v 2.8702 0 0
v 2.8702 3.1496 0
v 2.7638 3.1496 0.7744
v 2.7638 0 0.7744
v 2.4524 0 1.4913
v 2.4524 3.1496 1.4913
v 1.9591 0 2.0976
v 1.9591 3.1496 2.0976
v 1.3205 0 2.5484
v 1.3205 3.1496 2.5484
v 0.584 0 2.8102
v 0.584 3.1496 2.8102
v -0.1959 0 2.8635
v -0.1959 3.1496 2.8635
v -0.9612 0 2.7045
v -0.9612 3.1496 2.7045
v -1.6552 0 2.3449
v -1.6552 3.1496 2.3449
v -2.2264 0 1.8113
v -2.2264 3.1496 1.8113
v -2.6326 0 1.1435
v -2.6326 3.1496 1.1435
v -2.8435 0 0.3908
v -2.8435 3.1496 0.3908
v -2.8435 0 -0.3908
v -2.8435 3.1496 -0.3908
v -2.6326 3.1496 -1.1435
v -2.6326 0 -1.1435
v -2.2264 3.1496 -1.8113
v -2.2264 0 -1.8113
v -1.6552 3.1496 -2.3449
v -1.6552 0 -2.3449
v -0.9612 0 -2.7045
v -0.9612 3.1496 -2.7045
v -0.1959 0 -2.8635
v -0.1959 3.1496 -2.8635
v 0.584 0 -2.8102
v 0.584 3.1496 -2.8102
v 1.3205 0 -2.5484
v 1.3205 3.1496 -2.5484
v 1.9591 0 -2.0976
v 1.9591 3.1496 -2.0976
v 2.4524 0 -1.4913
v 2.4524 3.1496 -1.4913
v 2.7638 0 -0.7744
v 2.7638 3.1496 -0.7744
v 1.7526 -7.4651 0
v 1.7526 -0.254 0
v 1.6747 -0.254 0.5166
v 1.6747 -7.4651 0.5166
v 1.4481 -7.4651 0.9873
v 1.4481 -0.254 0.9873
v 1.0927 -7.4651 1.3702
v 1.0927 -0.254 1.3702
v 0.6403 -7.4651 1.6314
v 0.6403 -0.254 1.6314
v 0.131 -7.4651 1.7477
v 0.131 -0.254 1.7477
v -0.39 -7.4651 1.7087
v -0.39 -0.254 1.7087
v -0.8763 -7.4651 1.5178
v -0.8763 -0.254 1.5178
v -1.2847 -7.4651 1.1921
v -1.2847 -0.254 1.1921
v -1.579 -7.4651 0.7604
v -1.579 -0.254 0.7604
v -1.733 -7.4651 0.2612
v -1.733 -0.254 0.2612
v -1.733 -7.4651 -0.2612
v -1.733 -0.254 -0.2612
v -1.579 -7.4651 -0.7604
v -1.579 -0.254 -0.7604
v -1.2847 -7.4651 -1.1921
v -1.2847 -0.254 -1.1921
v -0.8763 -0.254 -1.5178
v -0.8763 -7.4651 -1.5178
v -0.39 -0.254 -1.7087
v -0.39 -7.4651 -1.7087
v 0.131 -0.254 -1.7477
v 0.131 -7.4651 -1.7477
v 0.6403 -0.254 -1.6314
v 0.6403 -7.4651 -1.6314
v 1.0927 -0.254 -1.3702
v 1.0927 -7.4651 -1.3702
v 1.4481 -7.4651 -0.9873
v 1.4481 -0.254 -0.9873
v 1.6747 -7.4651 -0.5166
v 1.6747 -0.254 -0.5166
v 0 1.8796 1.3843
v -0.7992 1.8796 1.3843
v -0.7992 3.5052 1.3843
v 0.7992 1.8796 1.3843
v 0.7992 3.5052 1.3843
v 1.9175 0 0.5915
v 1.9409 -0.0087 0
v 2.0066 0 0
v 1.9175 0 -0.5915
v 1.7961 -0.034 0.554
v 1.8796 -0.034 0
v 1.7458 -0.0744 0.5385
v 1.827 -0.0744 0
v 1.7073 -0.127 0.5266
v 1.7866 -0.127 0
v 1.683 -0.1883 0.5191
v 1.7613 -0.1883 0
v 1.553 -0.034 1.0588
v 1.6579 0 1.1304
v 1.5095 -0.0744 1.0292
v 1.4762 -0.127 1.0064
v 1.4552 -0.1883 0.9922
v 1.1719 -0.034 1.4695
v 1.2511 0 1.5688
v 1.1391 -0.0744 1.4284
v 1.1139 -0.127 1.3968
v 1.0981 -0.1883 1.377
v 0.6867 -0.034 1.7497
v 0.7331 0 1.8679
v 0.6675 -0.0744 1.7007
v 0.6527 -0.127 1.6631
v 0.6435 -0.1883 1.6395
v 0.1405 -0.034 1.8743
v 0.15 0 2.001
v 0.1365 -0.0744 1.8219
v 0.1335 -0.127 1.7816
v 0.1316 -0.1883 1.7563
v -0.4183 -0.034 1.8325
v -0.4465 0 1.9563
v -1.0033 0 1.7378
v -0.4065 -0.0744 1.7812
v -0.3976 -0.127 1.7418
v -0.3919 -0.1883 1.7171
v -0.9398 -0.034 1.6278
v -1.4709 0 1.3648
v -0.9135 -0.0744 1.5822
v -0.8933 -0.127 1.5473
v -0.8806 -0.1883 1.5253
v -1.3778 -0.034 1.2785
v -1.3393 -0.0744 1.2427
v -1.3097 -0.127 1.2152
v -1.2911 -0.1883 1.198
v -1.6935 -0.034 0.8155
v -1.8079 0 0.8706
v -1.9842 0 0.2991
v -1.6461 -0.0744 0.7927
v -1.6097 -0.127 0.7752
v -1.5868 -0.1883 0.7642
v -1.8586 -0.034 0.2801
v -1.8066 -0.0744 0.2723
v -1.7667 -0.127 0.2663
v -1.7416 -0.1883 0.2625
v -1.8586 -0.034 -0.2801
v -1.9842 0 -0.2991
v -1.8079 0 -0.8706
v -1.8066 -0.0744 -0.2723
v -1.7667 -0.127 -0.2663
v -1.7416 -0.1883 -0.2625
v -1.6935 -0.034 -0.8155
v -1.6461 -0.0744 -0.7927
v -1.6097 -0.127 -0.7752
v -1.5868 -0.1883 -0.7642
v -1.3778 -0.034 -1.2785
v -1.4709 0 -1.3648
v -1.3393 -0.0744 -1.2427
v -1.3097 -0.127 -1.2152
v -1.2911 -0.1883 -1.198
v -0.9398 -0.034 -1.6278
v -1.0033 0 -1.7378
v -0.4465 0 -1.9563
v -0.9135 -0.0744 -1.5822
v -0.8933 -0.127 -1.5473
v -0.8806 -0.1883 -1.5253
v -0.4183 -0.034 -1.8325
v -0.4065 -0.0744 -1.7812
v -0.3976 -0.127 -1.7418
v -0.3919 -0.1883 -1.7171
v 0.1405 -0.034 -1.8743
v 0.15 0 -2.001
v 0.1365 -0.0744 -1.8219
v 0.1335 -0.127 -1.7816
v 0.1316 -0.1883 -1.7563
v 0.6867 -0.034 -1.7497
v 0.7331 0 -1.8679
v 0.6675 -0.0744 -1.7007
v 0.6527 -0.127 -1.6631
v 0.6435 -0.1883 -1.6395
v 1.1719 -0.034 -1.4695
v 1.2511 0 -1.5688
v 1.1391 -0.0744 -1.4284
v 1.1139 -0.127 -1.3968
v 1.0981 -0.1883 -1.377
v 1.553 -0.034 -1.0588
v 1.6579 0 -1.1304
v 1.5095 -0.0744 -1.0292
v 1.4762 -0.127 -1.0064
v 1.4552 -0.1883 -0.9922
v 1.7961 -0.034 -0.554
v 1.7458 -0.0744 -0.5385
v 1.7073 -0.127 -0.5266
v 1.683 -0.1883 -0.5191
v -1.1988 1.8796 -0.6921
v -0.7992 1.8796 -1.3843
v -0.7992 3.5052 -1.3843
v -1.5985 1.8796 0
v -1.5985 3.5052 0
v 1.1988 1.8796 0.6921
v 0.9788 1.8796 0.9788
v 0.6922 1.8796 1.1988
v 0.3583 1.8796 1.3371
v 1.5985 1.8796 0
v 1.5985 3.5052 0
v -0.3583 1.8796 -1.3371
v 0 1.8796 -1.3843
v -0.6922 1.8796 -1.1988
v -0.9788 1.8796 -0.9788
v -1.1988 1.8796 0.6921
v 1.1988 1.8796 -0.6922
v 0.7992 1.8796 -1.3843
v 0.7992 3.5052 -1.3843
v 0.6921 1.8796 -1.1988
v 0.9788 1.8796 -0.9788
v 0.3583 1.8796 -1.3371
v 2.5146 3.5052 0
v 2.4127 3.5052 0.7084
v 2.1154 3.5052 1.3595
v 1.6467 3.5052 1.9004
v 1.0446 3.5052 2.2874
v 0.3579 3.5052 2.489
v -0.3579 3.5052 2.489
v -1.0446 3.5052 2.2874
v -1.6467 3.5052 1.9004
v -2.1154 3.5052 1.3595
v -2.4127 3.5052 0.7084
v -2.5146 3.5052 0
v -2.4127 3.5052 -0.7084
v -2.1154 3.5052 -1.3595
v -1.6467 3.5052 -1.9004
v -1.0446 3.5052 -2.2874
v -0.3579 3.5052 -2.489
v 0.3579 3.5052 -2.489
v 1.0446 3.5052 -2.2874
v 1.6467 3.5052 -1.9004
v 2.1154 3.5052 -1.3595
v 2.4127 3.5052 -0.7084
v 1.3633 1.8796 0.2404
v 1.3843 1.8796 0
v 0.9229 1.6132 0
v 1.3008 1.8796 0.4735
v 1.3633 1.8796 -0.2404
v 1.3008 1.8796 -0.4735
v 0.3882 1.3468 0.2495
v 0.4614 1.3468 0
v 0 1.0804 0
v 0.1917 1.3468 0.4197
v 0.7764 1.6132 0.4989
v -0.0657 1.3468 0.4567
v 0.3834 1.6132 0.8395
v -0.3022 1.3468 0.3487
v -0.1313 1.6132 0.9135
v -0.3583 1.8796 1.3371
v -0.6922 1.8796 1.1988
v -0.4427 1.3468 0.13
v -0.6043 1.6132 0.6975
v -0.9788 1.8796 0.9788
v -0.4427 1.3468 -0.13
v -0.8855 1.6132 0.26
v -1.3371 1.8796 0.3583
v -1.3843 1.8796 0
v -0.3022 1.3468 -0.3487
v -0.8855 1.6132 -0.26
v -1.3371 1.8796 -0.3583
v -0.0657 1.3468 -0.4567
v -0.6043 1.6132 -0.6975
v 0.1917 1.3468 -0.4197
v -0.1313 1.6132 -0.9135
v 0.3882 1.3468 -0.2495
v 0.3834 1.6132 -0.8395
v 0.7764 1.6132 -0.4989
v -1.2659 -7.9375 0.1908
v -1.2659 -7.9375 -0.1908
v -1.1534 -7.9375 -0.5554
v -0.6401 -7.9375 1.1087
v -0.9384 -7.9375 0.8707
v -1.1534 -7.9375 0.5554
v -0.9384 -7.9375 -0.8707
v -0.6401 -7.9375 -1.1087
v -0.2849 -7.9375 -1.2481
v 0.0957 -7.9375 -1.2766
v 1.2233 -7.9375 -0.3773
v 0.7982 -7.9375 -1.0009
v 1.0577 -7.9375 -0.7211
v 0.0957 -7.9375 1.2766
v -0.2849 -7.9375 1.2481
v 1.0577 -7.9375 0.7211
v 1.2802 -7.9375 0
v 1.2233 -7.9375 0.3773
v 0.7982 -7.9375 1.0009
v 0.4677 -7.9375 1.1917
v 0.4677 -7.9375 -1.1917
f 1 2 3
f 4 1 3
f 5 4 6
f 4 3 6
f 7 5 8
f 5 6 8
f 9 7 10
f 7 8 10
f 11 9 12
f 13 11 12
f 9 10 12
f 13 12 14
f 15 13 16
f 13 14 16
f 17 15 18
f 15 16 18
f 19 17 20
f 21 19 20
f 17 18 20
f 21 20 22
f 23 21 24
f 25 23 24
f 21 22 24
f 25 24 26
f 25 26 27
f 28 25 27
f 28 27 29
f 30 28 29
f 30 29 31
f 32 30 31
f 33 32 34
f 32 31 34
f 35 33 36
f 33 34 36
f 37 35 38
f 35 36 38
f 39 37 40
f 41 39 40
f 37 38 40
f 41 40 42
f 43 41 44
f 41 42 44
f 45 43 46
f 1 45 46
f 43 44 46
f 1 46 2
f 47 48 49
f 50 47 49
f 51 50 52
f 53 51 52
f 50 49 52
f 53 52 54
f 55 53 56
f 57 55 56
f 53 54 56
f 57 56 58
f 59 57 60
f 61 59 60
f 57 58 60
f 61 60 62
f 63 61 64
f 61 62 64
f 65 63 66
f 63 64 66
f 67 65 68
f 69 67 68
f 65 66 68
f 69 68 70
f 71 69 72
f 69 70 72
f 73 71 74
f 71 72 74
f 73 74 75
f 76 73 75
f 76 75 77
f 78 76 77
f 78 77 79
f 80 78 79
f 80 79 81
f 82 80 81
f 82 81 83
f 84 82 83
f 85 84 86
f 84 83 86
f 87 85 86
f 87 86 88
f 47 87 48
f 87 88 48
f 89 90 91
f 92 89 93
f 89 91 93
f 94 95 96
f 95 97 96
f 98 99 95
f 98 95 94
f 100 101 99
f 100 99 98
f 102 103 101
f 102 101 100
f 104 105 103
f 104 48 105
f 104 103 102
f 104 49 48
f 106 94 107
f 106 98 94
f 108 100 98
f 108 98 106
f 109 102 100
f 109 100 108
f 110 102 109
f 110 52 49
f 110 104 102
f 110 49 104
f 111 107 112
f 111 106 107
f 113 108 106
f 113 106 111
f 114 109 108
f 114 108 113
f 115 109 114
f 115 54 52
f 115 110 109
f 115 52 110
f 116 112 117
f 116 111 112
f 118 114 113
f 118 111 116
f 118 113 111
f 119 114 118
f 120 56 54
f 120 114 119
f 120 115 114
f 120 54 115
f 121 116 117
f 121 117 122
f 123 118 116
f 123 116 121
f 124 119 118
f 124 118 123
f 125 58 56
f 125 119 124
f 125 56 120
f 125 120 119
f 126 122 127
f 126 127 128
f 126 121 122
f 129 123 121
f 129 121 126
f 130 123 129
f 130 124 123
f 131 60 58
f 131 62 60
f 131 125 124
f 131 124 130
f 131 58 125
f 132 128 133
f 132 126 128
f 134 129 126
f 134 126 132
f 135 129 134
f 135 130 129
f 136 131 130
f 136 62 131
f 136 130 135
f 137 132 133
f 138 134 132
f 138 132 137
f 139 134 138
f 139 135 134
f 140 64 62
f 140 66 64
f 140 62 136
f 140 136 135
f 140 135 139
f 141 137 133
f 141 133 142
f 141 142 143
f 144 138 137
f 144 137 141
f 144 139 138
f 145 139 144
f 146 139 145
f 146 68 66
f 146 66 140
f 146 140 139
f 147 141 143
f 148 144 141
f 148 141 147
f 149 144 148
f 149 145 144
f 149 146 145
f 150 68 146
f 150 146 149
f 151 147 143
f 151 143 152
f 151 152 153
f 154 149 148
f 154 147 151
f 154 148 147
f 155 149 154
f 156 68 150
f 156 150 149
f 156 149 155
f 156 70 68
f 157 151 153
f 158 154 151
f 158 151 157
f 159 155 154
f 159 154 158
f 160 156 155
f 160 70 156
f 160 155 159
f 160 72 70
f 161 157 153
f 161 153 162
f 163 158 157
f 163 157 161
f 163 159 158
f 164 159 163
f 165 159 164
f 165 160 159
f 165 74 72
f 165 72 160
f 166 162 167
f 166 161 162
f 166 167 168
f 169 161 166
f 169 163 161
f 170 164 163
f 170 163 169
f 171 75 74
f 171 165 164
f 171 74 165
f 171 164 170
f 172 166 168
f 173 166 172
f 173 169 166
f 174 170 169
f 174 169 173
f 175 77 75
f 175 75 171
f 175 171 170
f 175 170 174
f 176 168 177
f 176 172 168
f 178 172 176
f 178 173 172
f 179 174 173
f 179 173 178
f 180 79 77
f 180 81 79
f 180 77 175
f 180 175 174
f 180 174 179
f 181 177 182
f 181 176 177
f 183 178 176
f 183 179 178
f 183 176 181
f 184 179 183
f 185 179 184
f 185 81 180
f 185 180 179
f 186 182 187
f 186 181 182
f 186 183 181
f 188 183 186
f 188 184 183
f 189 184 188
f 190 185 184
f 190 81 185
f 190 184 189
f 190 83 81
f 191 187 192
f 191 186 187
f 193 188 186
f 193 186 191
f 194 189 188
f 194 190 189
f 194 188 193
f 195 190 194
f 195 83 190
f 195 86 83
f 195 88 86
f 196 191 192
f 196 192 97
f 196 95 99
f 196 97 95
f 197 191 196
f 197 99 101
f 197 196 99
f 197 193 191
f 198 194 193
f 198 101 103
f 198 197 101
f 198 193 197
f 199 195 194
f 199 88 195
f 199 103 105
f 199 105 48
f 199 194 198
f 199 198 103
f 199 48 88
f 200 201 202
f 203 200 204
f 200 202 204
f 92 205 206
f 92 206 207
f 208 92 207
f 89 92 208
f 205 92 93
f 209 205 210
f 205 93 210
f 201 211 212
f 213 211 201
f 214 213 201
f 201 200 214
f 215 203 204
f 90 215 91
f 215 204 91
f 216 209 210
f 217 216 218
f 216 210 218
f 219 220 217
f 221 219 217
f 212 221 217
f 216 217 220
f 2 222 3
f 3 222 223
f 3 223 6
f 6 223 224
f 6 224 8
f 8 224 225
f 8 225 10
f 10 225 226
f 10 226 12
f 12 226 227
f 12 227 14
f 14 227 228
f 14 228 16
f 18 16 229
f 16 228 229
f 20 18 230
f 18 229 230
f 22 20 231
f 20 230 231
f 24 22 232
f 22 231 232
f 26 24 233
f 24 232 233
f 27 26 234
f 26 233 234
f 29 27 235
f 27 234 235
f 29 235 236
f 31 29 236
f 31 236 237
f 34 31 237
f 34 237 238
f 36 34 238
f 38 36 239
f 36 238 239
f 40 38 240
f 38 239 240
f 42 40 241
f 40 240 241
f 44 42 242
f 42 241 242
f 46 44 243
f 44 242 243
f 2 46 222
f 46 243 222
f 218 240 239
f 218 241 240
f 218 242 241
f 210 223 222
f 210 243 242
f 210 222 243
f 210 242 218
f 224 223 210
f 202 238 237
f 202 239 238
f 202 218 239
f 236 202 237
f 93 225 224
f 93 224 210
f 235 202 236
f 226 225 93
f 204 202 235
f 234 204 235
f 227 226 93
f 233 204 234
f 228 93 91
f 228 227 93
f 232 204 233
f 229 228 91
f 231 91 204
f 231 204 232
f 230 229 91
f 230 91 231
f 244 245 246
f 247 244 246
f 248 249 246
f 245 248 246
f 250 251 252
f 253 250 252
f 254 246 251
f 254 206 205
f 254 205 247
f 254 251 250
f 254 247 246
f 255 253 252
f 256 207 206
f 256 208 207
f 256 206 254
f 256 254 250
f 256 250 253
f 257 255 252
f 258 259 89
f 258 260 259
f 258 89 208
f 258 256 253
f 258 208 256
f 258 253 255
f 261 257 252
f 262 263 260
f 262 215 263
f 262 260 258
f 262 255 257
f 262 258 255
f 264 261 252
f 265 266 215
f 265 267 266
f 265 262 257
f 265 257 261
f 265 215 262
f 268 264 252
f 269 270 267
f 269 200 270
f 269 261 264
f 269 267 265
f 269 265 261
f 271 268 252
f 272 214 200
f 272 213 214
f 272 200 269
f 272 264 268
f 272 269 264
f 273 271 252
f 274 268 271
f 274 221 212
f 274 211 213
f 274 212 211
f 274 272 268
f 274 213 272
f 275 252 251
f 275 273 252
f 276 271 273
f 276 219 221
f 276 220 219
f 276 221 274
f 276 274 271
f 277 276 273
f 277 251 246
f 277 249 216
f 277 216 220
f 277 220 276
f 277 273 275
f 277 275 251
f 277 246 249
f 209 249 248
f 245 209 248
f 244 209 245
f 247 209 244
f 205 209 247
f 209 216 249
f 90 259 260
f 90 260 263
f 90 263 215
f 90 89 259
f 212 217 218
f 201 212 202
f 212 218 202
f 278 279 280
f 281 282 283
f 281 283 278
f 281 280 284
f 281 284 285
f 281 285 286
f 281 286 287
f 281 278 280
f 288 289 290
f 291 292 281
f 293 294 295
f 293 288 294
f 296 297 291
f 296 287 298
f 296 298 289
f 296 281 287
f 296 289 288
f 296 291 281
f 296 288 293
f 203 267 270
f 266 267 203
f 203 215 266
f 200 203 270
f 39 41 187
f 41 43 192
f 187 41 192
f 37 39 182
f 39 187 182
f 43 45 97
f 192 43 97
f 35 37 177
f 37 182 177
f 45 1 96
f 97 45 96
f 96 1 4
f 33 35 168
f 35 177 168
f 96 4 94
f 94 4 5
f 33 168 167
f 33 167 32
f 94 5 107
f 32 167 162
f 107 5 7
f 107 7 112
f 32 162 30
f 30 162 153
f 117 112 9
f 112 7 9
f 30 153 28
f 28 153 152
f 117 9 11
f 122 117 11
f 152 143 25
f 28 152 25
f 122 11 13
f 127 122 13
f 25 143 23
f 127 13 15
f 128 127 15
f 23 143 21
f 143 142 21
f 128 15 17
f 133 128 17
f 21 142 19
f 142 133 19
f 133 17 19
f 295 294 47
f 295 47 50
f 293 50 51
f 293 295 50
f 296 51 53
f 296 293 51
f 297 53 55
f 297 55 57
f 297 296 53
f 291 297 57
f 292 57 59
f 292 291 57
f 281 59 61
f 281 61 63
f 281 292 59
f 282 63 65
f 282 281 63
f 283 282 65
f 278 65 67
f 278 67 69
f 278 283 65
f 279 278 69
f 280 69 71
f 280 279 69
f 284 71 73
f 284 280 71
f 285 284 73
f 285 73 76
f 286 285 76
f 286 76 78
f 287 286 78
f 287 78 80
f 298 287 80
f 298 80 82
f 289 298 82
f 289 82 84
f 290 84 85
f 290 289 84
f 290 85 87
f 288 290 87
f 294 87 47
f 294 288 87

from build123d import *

# Parameters (mm, degrees)
SKETCH1_W           = 2.8702
SKETCH1_H           = 3.5052
SKETCH2_R           = 1.7526
BOSS_EXTRUDE1_DEPTH = 7.9375
CUT_EXTRUDE1_DEPTH  = 1.6256
CHAMFER1_SIZE       = 0.47244
CHAMFER2_SIZE       = 0.3556
FILLET1_R           = 0.254


with BuildPart() as part:
    # Sketch1 → Revolve1 (revolve)
    with BuildSketch(Plane.XY):
        with Locations((1.4351, 1.7526)):
            Rectangle(SKETCH1_W, SKETCH1_H)
    revolve(axis=Axis((0, 3.5052, 0), (0, -1, 0)))

    # Sketch2 → Boss-Extrude1 (add)
    with BuildSketch(Plane.XZ):
        Circle(SKETCH2_R)
    extrude(amount=BOSS_EXTRUDE1_DEPTH)

    # Sketch3 → Cut-Extrude1 (cut)
    with BuildSketch(Plane(origin=(0, 3.5052, 0), x_dir=(-1, 0, 0), z_dir=(0, 1, 0))):
        Polygon((-0.799225978, 1.3843), (-1.598451955, 0), (-0.799225978, -1.3843), (0.799225978, -1.3843), (1.598451955, 0), (0.799225978, 1.3843), align=None)
    extrude(amount=-CUT_EXTRUDE1_DEPTH, mode=Mode.SUBTRACT)

    # Sketch4 → Cut-Revolve1 (revolve, cut)
    with BuildSketch(Plane.XY):
        Polygon((1.3843, 1.8796), (0, 1.8796), (0, 1.080374022), align=None)
    revolve(axis=Axis((0, 1.879625, 0), (0, -1, 0)), mode=Mode.SUBTRACT)

    # Chamfer1
    chamfer1_edges = [part.edges().sort_by_distance(p)[0] for p in [
        (-1.7526, -7.9375, 0),
    ]]
    chamfer(chamfer1_edges, length=CHAMFER1_SIZE)

    # Chamfer2
    chamfer2_edges = [part.edges().sort_by_distance(p)[0] for p in [
        (-2.8702, 3.5052, 0),
    ]]
    chamfer(chamfer2_edges, length=CHAMFER2_SIZE)

    # Fillet1
    fillet1_edges = [part.edges().sort_by_distance(p)[0] for p in [
        (-1.7526, 0, 0),
    ]]
    fillet(fillet1_edges, radius=FILLET1_R)


solid = part.part
